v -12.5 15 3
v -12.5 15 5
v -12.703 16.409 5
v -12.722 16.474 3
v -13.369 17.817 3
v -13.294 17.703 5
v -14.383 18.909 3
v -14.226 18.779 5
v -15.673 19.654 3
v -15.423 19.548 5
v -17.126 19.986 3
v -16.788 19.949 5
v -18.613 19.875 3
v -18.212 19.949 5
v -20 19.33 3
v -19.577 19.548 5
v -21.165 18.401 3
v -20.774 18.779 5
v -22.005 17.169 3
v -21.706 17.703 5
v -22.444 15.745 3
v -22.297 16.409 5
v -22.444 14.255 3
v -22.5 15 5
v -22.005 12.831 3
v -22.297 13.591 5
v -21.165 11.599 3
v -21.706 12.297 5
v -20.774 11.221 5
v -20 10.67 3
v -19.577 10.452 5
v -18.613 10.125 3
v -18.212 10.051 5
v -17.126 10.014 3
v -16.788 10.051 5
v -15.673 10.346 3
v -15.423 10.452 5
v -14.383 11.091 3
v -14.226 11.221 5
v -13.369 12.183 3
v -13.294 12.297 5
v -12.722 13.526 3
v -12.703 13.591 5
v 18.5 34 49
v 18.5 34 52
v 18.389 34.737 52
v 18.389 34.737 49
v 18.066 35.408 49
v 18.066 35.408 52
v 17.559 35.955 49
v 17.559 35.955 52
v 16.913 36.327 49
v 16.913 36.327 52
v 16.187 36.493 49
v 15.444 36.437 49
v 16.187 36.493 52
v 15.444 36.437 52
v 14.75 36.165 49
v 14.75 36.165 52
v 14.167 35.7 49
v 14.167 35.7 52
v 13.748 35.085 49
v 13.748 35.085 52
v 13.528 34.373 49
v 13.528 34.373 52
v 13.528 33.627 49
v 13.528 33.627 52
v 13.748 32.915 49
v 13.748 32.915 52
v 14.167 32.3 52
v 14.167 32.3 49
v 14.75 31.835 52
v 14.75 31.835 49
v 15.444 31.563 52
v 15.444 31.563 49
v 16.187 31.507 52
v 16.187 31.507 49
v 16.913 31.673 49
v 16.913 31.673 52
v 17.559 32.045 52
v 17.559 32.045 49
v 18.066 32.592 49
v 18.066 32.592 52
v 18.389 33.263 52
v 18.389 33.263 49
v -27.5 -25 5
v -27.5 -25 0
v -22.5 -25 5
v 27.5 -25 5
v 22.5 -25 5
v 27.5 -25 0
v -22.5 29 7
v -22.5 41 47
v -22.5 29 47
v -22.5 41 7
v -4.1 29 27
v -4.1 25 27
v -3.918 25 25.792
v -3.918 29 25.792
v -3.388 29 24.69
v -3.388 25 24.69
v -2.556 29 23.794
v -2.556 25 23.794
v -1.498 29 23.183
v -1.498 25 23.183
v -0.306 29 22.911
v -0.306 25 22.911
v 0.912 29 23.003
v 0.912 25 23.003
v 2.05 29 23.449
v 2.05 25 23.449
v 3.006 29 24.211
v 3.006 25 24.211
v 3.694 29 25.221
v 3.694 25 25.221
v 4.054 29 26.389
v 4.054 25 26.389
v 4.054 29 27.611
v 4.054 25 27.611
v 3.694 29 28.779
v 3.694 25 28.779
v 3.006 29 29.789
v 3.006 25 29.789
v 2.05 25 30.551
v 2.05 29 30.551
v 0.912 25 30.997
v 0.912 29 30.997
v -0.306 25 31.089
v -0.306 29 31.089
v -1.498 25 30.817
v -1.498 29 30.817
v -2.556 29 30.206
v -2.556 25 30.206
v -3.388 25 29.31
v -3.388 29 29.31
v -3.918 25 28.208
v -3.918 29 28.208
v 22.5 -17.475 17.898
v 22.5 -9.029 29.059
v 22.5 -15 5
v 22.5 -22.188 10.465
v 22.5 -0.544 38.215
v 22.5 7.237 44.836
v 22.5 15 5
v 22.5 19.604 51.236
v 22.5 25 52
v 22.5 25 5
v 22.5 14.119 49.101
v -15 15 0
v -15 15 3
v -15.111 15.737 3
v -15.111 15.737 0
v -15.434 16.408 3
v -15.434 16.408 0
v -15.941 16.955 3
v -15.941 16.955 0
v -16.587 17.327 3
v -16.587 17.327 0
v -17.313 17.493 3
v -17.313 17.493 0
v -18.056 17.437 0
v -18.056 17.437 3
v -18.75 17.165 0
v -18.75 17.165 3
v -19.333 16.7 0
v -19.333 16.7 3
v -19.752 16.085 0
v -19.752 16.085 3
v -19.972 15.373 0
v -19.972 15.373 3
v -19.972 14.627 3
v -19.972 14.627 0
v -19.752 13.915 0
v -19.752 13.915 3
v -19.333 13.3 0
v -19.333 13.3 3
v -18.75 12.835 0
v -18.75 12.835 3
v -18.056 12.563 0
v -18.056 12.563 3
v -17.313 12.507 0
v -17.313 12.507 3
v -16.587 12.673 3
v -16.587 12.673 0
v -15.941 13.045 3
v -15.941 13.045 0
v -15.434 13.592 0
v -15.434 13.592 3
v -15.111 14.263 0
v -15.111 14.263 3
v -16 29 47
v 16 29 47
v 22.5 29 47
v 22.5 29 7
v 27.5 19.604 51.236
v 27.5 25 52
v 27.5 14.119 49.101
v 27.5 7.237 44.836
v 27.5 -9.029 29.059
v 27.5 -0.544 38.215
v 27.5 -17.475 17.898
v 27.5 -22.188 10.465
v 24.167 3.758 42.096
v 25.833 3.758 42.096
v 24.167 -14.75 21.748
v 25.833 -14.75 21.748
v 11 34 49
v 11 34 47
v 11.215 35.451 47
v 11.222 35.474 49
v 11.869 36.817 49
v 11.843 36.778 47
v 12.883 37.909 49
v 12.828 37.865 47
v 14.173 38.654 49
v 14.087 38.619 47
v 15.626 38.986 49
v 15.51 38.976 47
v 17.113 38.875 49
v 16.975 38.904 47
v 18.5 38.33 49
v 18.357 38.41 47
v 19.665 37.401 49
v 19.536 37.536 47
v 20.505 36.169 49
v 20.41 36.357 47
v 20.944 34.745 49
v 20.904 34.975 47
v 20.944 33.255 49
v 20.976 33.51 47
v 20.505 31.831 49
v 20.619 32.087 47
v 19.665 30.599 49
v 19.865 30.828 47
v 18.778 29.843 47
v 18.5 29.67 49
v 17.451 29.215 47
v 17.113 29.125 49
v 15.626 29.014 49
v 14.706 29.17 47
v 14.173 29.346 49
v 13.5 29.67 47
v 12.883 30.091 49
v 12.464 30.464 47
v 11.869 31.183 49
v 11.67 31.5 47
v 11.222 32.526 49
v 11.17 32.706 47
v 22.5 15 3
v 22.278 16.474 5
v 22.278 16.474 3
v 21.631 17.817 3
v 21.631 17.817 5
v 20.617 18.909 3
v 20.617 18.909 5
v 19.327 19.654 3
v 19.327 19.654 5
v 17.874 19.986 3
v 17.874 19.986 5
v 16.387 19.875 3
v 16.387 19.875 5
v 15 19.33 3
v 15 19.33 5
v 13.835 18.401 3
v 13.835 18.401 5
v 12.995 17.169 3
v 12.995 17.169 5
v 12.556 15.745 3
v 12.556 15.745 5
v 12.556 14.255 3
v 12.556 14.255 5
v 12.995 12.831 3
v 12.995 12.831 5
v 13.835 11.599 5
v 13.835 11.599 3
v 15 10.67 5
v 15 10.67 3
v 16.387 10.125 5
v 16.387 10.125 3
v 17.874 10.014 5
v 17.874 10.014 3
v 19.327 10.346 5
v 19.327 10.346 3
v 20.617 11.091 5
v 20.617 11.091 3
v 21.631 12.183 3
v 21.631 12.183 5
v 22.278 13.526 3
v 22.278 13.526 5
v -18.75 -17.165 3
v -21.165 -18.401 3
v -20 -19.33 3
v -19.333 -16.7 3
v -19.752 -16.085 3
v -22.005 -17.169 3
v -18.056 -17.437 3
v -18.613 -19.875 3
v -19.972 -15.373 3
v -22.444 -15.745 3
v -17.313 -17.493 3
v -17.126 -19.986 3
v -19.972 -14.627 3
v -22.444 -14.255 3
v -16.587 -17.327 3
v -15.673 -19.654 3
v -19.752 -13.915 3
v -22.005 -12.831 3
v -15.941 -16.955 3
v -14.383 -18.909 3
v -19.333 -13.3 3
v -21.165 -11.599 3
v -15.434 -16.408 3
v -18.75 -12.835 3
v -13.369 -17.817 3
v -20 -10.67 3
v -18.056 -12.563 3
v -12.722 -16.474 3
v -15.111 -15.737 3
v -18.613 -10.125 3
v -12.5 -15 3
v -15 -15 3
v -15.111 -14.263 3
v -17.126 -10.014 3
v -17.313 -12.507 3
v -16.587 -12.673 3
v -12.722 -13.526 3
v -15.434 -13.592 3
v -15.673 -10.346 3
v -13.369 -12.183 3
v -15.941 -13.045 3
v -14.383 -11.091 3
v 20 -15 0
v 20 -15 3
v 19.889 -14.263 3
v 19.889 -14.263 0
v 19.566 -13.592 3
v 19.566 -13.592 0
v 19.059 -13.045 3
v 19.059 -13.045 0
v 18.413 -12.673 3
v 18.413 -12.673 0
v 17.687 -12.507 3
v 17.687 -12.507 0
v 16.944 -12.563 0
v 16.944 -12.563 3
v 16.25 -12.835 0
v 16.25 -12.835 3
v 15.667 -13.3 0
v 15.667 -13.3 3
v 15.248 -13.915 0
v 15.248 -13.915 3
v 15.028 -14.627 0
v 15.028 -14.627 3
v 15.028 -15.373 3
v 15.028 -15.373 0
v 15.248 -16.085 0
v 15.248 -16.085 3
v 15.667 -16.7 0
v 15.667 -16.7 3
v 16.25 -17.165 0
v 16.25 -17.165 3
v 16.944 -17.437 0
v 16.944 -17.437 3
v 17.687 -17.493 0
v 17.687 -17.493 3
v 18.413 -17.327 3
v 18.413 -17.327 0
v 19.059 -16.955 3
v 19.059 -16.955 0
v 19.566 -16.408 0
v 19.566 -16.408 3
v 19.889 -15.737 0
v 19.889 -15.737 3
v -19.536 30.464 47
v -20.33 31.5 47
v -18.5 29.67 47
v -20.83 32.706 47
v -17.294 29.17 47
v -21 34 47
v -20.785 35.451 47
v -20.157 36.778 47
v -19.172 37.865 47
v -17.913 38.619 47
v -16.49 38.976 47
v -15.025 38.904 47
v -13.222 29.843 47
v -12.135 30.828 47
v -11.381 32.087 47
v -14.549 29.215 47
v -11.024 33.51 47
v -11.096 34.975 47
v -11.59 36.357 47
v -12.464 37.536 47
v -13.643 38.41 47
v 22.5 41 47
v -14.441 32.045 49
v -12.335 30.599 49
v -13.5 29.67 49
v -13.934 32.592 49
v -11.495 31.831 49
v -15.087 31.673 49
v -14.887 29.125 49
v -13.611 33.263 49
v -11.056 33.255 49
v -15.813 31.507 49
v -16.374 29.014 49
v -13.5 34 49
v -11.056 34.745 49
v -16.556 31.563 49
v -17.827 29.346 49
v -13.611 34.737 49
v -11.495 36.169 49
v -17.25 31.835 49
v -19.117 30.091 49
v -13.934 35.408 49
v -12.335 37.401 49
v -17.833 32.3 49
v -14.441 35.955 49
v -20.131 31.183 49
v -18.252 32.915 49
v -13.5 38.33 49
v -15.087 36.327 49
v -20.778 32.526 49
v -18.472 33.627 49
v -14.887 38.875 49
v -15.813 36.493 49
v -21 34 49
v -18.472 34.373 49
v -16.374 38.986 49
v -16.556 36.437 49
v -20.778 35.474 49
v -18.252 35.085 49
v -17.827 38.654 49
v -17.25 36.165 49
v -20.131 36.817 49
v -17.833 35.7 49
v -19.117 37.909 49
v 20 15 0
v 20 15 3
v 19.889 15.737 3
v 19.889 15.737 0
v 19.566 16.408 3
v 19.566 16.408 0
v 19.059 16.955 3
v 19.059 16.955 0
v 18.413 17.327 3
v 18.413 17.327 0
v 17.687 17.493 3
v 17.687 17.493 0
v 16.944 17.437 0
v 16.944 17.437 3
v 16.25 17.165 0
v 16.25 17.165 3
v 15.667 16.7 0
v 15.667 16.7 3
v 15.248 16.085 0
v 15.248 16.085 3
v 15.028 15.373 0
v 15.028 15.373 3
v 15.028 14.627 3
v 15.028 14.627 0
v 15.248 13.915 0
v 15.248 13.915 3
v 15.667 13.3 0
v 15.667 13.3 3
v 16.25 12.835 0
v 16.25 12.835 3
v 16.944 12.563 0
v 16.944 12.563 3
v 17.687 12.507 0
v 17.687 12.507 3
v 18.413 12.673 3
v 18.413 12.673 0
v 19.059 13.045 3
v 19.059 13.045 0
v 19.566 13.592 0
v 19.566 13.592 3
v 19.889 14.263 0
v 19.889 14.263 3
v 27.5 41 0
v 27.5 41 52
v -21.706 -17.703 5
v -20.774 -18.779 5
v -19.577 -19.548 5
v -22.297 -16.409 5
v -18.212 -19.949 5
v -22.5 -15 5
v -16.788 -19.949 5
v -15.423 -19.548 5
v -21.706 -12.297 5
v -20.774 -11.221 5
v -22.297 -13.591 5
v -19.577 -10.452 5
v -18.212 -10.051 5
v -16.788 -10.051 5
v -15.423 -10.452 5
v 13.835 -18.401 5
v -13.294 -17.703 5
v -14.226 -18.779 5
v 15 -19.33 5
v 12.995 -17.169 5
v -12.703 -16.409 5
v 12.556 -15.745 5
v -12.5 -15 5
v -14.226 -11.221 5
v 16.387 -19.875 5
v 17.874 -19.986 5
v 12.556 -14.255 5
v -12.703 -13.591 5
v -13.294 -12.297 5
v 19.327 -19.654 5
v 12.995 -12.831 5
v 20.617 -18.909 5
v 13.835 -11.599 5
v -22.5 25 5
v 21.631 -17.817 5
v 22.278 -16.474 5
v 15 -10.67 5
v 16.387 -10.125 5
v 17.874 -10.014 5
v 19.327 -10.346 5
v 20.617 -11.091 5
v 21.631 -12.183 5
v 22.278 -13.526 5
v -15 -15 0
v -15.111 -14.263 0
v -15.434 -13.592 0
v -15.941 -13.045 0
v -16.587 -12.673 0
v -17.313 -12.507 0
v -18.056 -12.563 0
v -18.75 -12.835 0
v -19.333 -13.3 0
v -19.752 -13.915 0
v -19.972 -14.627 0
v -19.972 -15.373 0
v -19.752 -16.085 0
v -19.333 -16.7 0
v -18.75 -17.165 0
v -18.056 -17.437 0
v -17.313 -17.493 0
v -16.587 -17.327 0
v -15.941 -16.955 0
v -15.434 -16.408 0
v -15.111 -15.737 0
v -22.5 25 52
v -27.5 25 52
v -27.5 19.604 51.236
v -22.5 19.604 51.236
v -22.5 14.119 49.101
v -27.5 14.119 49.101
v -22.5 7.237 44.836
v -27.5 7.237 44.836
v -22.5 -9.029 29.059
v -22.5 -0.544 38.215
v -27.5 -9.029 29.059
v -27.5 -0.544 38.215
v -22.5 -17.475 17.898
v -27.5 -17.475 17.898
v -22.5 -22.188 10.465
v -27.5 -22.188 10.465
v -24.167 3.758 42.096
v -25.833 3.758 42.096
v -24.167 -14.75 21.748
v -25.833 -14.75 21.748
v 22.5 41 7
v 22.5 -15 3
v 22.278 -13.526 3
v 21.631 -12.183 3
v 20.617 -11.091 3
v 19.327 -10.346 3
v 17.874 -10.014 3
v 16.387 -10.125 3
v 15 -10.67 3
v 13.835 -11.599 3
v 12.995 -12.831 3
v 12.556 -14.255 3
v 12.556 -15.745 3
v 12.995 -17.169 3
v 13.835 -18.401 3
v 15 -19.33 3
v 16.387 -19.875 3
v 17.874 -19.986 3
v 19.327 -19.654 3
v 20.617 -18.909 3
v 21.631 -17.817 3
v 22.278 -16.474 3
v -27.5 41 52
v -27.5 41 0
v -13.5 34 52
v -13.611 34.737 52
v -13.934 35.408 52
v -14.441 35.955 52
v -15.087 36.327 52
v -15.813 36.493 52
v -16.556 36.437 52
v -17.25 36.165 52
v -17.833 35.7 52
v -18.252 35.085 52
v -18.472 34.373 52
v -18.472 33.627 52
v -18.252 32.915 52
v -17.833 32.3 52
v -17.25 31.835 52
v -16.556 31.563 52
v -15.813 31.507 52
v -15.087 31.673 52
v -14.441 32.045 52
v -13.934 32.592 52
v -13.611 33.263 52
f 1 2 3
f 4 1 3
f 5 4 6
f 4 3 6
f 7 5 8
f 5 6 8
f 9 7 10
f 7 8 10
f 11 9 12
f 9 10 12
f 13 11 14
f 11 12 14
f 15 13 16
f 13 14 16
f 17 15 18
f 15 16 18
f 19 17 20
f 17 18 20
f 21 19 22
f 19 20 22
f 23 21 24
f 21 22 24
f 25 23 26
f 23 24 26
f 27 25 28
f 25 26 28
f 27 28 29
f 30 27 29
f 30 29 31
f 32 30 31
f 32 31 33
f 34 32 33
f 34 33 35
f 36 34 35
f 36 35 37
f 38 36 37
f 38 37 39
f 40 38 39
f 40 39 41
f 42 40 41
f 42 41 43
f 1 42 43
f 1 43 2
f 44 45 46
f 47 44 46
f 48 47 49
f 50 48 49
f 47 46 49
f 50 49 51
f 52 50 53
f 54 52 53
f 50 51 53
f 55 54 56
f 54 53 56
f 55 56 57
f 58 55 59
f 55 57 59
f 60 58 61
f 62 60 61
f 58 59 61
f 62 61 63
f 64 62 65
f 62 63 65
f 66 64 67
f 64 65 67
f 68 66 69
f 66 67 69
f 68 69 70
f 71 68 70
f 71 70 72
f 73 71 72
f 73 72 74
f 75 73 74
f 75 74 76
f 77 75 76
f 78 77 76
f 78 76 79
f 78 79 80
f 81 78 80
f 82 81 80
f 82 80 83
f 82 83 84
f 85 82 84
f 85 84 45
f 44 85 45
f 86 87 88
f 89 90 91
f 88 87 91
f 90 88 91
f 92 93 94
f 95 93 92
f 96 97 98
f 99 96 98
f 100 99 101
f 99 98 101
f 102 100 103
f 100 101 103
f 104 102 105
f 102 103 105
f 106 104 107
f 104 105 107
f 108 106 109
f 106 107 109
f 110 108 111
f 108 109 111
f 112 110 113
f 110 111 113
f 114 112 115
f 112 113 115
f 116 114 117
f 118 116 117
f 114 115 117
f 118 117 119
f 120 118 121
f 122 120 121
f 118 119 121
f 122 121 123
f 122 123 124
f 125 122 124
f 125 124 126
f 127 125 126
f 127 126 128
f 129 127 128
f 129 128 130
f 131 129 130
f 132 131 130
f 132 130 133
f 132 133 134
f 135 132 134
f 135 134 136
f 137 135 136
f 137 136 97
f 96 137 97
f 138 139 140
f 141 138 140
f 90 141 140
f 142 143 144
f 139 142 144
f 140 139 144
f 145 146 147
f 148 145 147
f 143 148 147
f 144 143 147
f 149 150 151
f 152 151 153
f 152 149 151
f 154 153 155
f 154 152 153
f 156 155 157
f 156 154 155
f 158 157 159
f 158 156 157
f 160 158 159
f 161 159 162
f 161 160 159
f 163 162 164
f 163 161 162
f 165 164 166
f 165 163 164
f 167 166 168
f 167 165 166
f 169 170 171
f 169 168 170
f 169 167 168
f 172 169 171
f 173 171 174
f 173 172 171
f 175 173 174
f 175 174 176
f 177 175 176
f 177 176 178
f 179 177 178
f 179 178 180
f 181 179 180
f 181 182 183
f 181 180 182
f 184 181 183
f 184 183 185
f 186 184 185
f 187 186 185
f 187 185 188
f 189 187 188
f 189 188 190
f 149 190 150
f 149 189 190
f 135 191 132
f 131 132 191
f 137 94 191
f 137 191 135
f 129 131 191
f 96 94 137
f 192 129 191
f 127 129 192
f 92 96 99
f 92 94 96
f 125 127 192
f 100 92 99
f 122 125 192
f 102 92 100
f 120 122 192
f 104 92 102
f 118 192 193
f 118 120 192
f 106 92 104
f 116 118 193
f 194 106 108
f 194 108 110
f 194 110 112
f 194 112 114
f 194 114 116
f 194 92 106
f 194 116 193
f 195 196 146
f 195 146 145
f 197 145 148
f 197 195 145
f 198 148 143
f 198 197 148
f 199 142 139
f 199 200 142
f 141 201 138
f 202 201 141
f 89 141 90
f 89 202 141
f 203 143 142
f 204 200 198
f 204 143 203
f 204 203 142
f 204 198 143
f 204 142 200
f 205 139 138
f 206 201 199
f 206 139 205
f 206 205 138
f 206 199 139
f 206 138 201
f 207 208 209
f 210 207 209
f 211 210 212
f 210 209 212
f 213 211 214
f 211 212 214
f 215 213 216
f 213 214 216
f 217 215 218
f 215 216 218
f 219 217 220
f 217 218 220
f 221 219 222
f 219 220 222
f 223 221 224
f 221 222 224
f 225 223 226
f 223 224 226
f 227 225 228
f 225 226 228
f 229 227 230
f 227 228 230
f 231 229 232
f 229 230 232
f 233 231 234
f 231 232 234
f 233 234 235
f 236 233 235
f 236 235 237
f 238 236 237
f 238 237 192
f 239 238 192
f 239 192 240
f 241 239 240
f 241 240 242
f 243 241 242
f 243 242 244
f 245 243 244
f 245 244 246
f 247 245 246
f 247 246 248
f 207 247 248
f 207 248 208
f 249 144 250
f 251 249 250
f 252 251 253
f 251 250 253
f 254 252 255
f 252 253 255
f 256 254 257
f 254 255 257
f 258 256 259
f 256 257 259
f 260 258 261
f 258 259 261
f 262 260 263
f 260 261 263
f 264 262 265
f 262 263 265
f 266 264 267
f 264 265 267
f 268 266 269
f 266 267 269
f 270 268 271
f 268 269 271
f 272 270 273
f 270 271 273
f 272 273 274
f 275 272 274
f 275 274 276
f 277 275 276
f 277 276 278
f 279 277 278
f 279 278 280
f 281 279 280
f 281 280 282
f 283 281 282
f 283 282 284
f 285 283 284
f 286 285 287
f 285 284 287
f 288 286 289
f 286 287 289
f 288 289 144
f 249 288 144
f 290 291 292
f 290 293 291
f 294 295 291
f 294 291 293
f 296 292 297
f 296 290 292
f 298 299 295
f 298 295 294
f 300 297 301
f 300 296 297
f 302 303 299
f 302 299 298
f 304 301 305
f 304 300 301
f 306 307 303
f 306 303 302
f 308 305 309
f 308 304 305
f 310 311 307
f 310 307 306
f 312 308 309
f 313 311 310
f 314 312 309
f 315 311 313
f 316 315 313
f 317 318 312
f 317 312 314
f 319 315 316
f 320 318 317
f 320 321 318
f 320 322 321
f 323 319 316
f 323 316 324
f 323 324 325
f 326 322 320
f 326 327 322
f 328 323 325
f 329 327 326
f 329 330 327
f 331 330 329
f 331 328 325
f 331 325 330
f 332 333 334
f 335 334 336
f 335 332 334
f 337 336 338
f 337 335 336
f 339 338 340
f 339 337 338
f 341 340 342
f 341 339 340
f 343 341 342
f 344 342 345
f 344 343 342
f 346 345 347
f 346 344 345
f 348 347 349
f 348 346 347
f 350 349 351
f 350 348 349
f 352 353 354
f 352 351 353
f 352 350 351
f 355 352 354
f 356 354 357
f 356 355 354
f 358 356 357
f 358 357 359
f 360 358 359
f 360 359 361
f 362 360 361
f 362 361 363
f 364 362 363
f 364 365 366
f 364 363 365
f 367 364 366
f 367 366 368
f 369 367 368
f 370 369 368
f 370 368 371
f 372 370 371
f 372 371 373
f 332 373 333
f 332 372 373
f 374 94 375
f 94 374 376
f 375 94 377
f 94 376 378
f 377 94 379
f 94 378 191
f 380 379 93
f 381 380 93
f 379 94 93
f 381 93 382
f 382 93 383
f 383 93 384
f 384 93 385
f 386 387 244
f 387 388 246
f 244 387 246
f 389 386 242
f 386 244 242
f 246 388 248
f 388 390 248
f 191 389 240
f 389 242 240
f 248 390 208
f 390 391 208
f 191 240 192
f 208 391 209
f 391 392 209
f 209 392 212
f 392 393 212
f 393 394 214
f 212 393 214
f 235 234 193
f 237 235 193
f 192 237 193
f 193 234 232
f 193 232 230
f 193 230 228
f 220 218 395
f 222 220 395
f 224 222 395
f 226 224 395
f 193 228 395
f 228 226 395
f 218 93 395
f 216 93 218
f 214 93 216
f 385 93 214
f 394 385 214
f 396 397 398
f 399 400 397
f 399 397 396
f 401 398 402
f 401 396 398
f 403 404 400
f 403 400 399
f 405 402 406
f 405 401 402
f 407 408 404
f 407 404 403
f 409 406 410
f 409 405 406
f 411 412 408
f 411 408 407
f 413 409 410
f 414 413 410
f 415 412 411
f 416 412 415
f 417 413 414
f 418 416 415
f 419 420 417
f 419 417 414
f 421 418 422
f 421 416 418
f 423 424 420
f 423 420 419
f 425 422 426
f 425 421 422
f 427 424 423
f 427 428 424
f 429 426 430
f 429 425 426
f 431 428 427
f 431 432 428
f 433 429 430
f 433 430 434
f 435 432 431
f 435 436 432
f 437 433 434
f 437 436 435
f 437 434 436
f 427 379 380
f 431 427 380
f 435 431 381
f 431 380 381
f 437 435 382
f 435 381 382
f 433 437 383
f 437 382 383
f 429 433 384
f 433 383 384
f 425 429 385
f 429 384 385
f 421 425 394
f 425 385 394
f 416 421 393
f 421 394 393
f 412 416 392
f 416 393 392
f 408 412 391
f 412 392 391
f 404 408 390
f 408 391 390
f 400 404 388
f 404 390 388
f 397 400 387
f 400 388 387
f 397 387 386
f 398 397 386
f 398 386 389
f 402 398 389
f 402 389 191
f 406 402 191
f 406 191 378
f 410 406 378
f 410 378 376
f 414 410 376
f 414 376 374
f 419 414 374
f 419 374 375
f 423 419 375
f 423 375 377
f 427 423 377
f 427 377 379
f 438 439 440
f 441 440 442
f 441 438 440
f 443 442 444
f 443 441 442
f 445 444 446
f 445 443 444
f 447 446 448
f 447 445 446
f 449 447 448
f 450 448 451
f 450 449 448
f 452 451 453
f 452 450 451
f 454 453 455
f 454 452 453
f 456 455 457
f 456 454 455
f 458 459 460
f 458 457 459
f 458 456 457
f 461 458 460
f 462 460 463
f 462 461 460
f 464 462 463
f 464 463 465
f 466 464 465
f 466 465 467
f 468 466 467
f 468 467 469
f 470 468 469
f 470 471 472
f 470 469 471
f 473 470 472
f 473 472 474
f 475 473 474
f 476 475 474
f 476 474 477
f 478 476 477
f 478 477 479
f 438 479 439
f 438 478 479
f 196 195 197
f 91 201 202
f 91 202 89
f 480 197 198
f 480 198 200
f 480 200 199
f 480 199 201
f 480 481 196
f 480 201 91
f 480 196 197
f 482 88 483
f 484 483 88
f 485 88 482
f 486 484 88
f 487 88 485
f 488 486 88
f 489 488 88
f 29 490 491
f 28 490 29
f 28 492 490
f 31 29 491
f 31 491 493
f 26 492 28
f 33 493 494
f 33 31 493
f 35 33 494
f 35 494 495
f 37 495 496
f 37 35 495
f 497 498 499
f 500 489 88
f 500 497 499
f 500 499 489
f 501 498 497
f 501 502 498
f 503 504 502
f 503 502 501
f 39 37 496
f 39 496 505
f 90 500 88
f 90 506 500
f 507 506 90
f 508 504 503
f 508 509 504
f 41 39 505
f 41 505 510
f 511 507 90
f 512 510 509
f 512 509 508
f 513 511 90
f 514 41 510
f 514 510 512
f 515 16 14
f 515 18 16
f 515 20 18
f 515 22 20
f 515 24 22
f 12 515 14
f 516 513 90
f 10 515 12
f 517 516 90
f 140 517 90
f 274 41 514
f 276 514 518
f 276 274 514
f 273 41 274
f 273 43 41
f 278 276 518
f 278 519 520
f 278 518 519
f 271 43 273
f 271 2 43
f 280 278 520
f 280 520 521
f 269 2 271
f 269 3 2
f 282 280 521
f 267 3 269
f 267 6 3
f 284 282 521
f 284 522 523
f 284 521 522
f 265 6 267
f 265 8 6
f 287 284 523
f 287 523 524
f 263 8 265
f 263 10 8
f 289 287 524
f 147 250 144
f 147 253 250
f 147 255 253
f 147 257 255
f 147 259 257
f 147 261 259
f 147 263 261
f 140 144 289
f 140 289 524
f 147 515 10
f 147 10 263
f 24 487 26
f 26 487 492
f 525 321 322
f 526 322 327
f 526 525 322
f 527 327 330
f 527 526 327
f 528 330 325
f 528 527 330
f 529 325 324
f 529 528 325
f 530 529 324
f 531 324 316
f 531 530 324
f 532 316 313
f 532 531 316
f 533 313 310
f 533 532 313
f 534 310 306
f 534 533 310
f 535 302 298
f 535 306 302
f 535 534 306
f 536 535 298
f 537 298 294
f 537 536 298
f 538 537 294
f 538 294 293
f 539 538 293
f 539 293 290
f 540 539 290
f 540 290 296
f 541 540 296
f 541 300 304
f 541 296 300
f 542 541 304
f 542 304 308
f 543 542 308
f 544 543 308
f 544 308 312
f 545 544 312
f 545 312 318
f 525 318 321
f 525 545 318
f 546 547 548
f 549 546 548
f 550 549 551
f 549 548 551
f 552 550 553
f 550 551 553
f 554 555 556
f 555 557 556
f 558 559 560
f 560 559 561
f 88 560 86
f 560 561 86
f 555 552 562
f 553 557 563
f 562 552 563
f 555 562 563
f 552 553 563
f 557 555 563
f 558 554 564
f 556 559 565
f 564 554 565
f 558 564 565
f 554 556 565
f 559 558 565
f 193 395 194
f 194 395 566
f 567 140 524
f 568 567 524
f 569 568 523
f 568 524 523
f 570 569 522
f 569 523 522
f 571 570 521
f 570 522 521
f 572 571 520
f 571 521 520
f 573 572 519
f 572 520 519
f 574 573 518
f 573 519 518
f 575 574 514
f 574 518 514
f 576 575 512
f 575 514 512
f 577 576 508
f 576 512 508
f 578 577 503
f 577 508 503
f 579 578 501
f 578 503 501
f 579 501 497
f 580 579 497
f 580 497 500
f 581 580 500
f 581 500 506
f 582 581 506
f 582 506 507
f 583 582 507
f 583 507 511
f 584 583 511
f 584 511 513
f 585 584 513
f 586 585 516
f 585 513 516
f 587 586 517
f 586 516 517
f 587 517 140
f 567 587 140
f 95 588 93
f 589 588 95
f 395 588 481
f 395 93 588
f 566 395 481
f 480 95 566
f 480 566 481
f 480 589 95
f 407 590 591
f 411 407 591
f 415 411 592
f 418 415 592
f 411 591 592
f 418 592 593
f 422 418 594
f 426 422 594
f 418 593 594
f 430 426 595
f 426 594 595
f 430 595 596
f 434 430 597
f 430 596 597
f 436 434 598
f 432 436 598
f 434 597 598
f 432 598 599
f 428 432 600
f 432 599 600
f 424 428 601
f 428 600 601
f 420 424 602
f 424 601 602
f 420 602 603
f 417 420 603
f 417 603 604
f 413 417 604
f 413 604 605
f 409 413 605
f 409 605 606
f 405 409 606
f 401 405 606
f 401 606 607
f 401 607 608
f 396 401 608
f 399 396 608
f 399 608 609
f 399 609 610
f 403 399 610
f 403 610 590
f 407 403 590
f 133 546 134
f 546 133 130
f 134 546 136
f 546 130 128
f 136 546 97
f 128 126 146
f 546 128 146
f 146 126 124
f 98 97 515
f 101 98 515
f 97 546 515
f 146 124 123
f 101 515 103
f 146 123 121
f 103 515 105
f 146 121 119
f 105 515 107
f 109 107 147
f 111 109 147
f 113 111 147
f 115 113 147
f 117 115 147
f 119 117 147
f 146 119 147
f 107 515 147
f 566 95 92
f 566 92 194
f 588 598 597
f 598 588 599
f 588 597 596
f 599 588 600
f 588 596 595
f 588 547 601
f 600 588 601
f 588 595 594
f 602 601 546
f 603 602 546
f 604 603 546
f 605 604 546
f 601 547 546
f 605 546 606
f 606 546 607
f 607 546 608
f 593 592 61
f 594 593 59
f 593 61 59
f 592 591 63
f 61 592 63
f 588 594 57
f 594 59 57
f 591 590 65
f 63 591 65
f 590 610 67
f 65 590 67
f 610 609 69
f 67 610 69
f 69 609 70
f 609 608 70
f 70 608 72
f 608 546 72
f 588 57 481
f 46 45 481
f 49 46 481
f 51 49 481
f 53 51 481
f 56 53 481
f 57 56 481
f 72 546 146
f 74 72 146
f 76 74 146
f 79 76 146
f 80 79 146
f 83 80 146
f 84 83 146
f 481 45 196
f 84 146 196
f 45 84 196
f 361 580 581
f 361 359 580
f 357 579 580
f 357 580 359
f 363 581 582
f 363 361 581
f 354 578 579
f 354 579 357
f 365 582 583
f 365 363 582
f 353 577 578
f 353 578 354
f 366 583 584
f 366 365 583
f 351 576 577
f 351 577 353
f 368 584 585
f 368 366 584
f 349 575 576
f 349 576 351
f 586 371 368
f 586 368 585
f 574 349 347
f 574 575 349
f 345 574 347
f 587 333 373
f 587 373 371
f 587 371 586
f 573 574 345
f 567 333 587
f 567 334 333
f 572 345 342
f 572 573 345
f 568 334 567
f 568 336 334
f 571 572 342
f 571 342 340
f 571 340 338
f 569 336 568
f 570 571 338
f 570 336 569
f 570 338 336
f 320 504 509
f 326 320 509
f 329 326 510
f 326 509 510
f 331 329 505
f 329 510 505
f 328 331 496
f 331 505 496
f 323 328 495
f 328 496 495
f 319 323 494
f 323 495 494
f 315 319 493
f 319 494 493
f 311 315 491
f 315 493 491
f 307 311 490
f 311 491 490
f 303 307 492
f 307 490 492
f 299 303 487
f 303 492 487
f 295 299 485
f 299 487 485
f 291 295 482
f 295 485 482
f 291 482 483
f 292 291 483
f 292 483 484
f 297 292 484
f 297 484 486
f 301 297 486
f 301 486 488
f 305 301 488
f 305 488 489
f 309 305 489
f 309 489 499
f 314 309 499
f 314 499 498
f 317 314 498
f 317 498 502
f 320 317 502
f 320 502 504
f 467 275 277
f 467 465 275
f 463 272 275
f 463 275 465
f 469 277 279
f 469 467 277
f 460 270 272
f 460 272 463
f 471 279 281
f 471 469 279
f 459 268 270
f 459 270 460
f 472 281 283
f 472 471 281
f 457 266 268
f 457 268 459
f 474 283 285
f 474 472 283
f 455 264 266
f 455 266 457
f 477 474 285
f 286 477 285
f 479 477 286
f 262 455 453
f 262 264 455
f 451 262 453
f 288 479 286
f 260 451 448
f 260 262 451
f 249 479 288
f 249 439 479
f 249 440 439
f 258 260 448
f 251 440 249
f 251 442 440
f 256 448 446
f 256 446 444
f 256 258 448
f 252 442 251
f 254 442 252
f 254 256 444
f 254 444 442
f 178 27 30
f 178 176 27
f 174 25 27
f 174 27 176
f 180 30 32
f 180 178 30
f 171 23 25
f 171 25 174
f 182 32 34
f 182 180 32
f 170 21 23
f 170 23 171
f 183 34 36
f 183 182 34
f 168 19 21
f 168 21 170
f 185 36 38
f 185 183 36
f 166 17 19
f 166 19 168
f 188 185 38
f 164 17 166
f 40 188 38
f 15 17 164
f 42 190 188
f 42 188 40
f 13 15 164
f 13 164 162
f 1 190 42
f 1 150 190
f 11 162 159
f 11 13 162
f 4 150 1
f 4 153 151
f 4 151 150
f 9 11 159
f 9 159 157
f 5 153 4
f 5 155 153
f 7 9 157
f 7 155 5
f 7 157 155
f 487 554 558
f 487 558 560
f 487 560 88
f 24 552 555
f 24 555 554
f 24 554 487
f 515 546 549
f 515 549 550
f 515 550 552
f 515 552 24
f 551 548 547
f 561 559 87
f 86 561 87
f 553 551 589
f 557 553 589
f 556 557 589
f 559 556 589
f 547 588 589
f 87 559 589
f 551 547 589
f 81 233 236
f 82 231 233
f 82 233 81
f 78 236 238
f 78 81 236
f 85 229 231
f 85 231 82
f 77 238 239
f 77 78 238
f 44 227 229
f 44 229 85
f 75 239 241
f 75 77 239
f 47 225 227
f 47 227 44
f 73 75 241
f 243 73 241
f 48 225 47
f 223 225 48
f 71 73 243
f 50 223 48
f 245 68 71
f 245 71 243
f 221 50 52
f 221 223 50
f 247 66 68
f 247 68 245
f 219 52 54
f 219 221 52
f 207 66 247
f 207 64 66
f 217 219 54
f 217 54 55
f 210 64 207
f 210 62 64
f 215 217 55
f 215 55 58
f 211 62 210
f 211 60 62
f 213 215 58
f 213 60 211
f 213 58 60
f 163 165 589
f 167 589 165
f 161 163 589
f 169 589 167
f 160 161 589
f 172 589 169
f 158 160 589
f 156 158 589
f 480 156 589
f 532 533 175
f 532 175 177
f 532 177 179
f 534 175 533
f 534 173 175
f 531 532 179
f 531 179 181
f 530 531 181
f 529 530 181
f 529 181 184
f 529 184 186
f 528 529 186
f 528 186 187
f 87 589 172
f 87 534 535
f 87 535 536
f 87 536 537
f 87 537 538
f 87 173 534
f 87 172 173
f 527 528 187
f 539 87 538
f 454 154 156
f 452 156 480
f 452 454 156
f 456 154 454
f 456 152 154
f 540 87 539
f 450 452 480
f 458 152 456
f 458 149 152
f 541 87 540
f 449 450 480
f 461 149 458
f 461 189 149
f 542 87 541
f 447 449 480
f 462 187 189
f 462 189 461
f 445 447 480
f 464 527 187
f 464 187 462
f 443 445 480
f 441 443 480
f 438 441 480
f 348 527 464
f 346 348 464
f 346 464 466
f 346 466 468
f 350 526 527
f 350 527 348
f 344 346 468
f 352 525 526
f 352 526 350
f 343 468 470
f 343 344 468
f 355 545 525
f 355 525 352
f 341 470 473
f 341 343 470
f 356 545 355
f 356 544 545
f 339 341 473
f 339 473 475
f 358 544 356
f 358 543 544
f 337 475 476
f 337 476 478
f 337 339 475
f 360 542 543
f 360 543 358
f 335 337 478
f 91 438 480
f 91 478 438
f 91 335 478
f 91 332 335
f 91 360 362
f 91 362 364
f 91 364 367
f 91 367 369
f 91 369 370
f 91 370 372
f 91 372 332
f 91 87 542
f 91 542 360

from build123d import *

# Parameters (mm, degrees)
SKETCH1_W           = 55
SKETCH1_H           = 50
SKETCH1_R           = 2.5
BOSS_EXTRUDE1_DEPTH = 5
SKETCH2_R           = 5
CUT_EXTRUDE1_DEPTH  = 2
SKETCH3_W           = 55
SKETCH3_H           = 52
BOSS_EXTRUDE2_DEPTH = 16
SKETCH4_R           = 4.1
CUT_EXTRUDE2_DEPTH  = 17
BOSS_EXTRUDE3_DEPTH = 5
SKETCH6_W           = 45
SKETCH6_H           = 40
CUT_EXTRUDE3_DEPTH  = 12
SKETCH8_R           = 2.5
CUT_EXTRUDE5_DEPTH  = 5
SKETCH10_R          = 5
CUT_EXTRUDE6_DEPTH  = 2


with BuildPart() as part:
    # Sketch1 → Boss-Extrude1 (new body)
    with BuildSketch(Plane.XY):
        Rectangle(SKETCH1_W, SKETCH1_H)
        with Locations((-17.5, -15)):
            Circle(SKETCH1_R, mode=Mode.SUBTRACT)
        with Locations((17.5, -15)):
            Circle(SKETCH1_R, mode=Mode.SUBTRACT)
        with Locations((17.5, 15)):
            Circle(SKETCH1_R, mode=Mode.SUBTRACT)
        with Locations((-17.5, 15)):
            Circle(SKETCH1_R, mode=Mode.SUBTRACT)
    extrude(amount=BOSS_EXTRUDE1_DEPTH)

    # Sketch2 → Cut-Extrude1 (cut)
    with BuildSketch(Plane.XY.offset(5)):
        with Locations((-17.5, -15)):
            Circle(SKETCH2_R)
        with Locations((17.5, -15)):
            Circle(SKETCH2_R)
        with Locations((-17.5, 15)):
            Circle(SKETCH2_R)
        with Locations((17.5, 15)):
            Circle(SKETCH2_R)
    extrude(amount=-CUT_EXTRUDE1_DEPTH, mode=Mode.SUBTRACT)

    # Sketch3 → Boss-Extrude2 (add)
    with BuildSketch(Plane(origin=(0, 25, 0), x_dir=(1, 0, 0), z_dir=(0, 1, 0))):
        with Locations((0, -26)):
            Rectangle(SKETCH3_W, SKETCH3_H)
    extrude(amount=BOSS_EXTRUDE2_DEPTH)

    # Sketch4 → Cut-Extrude2 (cut, through all)
    with BuildSketch(Plane(origin=(0, 25, 0), x_dir=(-1, 0, 0), z_dir=(0, -1, 0))):
        with Locations((0, -27)):
            Circle(SKETCH4_R)
    extrude(amount=-CUT_EXTRUDE2_DEPTH, mode=Mode.SUBTRACT)

    # Sketch5 → Boss-Extrude3 (add)
    with BuildSketch(Plane.ZY.offset(27.5)):
        with BuildLine():
            Line((5, -25), (5, 25))
            Line((5, 25), (52, 25))
            add(Edge.make_bspline(
                [(52, 25), (52, 4.232970162), (15.26663468, -20.719918254), (5, -25)],
                knots=[0, 0, 0, 0, 0.911487557, 0.911487557, 0.911487557, 0.911487557], degree=3))
        make_face()
    boss_extrude3 = extrude(amount=-BOSS_EXTRUDE3_DEPTH)

    # Mirror1: Boss-Extrude3 across plane
    add(boss_extrude3.mirror(Plane(origin=(0, 0, 0), x_dir=(0, 0, 1), z_dir=(1, 0, 0))))

    # Sketch6 → Cut-Extrude3 (cut)
    with BuildSketch(Plane(origin=(0, 41, 0), x_dir=(1, 0, 0), z_dir=(0, 1, 0))):
        with Locations((0, -27)):
            Rectangle(SKETCH6_W, SKETCH6_H)
    extrude(amount=-CUT_EXTRUDE3_DEPTH, mode=Mode.SUBTRACT)

    # Sketch8 → Cut-Extrude5 (cut)
    with BuildSketch(Plane.XY.offset(52)):
        with Locations((16, 34)):
            Circle(SKETCH8_R)
        with Locations((-16, 34)):
            Circle(SKETCH8_R)
    extrude(amount=-CUT_EXTRUDE5_DEPTH, mode=Mode.SUBTRACT)

    # Sketch10 → Cut-Extrude6 (cut)
    with BuildSketch(Plane(origin=(0, 0, 47), x_dir=(-1, 0, 0), z_dir=(0, 0, -1))):
        with Locations((-16, 34)):
            Circle(SKETCH10_R)
        with Locations((16, 34)):
            Circle(SKETCH10_R)
    extrude(amount=-CUT_EXTRUDE6_DEPTH, mode=Mode.SUBTRACT)


solid = part.part
